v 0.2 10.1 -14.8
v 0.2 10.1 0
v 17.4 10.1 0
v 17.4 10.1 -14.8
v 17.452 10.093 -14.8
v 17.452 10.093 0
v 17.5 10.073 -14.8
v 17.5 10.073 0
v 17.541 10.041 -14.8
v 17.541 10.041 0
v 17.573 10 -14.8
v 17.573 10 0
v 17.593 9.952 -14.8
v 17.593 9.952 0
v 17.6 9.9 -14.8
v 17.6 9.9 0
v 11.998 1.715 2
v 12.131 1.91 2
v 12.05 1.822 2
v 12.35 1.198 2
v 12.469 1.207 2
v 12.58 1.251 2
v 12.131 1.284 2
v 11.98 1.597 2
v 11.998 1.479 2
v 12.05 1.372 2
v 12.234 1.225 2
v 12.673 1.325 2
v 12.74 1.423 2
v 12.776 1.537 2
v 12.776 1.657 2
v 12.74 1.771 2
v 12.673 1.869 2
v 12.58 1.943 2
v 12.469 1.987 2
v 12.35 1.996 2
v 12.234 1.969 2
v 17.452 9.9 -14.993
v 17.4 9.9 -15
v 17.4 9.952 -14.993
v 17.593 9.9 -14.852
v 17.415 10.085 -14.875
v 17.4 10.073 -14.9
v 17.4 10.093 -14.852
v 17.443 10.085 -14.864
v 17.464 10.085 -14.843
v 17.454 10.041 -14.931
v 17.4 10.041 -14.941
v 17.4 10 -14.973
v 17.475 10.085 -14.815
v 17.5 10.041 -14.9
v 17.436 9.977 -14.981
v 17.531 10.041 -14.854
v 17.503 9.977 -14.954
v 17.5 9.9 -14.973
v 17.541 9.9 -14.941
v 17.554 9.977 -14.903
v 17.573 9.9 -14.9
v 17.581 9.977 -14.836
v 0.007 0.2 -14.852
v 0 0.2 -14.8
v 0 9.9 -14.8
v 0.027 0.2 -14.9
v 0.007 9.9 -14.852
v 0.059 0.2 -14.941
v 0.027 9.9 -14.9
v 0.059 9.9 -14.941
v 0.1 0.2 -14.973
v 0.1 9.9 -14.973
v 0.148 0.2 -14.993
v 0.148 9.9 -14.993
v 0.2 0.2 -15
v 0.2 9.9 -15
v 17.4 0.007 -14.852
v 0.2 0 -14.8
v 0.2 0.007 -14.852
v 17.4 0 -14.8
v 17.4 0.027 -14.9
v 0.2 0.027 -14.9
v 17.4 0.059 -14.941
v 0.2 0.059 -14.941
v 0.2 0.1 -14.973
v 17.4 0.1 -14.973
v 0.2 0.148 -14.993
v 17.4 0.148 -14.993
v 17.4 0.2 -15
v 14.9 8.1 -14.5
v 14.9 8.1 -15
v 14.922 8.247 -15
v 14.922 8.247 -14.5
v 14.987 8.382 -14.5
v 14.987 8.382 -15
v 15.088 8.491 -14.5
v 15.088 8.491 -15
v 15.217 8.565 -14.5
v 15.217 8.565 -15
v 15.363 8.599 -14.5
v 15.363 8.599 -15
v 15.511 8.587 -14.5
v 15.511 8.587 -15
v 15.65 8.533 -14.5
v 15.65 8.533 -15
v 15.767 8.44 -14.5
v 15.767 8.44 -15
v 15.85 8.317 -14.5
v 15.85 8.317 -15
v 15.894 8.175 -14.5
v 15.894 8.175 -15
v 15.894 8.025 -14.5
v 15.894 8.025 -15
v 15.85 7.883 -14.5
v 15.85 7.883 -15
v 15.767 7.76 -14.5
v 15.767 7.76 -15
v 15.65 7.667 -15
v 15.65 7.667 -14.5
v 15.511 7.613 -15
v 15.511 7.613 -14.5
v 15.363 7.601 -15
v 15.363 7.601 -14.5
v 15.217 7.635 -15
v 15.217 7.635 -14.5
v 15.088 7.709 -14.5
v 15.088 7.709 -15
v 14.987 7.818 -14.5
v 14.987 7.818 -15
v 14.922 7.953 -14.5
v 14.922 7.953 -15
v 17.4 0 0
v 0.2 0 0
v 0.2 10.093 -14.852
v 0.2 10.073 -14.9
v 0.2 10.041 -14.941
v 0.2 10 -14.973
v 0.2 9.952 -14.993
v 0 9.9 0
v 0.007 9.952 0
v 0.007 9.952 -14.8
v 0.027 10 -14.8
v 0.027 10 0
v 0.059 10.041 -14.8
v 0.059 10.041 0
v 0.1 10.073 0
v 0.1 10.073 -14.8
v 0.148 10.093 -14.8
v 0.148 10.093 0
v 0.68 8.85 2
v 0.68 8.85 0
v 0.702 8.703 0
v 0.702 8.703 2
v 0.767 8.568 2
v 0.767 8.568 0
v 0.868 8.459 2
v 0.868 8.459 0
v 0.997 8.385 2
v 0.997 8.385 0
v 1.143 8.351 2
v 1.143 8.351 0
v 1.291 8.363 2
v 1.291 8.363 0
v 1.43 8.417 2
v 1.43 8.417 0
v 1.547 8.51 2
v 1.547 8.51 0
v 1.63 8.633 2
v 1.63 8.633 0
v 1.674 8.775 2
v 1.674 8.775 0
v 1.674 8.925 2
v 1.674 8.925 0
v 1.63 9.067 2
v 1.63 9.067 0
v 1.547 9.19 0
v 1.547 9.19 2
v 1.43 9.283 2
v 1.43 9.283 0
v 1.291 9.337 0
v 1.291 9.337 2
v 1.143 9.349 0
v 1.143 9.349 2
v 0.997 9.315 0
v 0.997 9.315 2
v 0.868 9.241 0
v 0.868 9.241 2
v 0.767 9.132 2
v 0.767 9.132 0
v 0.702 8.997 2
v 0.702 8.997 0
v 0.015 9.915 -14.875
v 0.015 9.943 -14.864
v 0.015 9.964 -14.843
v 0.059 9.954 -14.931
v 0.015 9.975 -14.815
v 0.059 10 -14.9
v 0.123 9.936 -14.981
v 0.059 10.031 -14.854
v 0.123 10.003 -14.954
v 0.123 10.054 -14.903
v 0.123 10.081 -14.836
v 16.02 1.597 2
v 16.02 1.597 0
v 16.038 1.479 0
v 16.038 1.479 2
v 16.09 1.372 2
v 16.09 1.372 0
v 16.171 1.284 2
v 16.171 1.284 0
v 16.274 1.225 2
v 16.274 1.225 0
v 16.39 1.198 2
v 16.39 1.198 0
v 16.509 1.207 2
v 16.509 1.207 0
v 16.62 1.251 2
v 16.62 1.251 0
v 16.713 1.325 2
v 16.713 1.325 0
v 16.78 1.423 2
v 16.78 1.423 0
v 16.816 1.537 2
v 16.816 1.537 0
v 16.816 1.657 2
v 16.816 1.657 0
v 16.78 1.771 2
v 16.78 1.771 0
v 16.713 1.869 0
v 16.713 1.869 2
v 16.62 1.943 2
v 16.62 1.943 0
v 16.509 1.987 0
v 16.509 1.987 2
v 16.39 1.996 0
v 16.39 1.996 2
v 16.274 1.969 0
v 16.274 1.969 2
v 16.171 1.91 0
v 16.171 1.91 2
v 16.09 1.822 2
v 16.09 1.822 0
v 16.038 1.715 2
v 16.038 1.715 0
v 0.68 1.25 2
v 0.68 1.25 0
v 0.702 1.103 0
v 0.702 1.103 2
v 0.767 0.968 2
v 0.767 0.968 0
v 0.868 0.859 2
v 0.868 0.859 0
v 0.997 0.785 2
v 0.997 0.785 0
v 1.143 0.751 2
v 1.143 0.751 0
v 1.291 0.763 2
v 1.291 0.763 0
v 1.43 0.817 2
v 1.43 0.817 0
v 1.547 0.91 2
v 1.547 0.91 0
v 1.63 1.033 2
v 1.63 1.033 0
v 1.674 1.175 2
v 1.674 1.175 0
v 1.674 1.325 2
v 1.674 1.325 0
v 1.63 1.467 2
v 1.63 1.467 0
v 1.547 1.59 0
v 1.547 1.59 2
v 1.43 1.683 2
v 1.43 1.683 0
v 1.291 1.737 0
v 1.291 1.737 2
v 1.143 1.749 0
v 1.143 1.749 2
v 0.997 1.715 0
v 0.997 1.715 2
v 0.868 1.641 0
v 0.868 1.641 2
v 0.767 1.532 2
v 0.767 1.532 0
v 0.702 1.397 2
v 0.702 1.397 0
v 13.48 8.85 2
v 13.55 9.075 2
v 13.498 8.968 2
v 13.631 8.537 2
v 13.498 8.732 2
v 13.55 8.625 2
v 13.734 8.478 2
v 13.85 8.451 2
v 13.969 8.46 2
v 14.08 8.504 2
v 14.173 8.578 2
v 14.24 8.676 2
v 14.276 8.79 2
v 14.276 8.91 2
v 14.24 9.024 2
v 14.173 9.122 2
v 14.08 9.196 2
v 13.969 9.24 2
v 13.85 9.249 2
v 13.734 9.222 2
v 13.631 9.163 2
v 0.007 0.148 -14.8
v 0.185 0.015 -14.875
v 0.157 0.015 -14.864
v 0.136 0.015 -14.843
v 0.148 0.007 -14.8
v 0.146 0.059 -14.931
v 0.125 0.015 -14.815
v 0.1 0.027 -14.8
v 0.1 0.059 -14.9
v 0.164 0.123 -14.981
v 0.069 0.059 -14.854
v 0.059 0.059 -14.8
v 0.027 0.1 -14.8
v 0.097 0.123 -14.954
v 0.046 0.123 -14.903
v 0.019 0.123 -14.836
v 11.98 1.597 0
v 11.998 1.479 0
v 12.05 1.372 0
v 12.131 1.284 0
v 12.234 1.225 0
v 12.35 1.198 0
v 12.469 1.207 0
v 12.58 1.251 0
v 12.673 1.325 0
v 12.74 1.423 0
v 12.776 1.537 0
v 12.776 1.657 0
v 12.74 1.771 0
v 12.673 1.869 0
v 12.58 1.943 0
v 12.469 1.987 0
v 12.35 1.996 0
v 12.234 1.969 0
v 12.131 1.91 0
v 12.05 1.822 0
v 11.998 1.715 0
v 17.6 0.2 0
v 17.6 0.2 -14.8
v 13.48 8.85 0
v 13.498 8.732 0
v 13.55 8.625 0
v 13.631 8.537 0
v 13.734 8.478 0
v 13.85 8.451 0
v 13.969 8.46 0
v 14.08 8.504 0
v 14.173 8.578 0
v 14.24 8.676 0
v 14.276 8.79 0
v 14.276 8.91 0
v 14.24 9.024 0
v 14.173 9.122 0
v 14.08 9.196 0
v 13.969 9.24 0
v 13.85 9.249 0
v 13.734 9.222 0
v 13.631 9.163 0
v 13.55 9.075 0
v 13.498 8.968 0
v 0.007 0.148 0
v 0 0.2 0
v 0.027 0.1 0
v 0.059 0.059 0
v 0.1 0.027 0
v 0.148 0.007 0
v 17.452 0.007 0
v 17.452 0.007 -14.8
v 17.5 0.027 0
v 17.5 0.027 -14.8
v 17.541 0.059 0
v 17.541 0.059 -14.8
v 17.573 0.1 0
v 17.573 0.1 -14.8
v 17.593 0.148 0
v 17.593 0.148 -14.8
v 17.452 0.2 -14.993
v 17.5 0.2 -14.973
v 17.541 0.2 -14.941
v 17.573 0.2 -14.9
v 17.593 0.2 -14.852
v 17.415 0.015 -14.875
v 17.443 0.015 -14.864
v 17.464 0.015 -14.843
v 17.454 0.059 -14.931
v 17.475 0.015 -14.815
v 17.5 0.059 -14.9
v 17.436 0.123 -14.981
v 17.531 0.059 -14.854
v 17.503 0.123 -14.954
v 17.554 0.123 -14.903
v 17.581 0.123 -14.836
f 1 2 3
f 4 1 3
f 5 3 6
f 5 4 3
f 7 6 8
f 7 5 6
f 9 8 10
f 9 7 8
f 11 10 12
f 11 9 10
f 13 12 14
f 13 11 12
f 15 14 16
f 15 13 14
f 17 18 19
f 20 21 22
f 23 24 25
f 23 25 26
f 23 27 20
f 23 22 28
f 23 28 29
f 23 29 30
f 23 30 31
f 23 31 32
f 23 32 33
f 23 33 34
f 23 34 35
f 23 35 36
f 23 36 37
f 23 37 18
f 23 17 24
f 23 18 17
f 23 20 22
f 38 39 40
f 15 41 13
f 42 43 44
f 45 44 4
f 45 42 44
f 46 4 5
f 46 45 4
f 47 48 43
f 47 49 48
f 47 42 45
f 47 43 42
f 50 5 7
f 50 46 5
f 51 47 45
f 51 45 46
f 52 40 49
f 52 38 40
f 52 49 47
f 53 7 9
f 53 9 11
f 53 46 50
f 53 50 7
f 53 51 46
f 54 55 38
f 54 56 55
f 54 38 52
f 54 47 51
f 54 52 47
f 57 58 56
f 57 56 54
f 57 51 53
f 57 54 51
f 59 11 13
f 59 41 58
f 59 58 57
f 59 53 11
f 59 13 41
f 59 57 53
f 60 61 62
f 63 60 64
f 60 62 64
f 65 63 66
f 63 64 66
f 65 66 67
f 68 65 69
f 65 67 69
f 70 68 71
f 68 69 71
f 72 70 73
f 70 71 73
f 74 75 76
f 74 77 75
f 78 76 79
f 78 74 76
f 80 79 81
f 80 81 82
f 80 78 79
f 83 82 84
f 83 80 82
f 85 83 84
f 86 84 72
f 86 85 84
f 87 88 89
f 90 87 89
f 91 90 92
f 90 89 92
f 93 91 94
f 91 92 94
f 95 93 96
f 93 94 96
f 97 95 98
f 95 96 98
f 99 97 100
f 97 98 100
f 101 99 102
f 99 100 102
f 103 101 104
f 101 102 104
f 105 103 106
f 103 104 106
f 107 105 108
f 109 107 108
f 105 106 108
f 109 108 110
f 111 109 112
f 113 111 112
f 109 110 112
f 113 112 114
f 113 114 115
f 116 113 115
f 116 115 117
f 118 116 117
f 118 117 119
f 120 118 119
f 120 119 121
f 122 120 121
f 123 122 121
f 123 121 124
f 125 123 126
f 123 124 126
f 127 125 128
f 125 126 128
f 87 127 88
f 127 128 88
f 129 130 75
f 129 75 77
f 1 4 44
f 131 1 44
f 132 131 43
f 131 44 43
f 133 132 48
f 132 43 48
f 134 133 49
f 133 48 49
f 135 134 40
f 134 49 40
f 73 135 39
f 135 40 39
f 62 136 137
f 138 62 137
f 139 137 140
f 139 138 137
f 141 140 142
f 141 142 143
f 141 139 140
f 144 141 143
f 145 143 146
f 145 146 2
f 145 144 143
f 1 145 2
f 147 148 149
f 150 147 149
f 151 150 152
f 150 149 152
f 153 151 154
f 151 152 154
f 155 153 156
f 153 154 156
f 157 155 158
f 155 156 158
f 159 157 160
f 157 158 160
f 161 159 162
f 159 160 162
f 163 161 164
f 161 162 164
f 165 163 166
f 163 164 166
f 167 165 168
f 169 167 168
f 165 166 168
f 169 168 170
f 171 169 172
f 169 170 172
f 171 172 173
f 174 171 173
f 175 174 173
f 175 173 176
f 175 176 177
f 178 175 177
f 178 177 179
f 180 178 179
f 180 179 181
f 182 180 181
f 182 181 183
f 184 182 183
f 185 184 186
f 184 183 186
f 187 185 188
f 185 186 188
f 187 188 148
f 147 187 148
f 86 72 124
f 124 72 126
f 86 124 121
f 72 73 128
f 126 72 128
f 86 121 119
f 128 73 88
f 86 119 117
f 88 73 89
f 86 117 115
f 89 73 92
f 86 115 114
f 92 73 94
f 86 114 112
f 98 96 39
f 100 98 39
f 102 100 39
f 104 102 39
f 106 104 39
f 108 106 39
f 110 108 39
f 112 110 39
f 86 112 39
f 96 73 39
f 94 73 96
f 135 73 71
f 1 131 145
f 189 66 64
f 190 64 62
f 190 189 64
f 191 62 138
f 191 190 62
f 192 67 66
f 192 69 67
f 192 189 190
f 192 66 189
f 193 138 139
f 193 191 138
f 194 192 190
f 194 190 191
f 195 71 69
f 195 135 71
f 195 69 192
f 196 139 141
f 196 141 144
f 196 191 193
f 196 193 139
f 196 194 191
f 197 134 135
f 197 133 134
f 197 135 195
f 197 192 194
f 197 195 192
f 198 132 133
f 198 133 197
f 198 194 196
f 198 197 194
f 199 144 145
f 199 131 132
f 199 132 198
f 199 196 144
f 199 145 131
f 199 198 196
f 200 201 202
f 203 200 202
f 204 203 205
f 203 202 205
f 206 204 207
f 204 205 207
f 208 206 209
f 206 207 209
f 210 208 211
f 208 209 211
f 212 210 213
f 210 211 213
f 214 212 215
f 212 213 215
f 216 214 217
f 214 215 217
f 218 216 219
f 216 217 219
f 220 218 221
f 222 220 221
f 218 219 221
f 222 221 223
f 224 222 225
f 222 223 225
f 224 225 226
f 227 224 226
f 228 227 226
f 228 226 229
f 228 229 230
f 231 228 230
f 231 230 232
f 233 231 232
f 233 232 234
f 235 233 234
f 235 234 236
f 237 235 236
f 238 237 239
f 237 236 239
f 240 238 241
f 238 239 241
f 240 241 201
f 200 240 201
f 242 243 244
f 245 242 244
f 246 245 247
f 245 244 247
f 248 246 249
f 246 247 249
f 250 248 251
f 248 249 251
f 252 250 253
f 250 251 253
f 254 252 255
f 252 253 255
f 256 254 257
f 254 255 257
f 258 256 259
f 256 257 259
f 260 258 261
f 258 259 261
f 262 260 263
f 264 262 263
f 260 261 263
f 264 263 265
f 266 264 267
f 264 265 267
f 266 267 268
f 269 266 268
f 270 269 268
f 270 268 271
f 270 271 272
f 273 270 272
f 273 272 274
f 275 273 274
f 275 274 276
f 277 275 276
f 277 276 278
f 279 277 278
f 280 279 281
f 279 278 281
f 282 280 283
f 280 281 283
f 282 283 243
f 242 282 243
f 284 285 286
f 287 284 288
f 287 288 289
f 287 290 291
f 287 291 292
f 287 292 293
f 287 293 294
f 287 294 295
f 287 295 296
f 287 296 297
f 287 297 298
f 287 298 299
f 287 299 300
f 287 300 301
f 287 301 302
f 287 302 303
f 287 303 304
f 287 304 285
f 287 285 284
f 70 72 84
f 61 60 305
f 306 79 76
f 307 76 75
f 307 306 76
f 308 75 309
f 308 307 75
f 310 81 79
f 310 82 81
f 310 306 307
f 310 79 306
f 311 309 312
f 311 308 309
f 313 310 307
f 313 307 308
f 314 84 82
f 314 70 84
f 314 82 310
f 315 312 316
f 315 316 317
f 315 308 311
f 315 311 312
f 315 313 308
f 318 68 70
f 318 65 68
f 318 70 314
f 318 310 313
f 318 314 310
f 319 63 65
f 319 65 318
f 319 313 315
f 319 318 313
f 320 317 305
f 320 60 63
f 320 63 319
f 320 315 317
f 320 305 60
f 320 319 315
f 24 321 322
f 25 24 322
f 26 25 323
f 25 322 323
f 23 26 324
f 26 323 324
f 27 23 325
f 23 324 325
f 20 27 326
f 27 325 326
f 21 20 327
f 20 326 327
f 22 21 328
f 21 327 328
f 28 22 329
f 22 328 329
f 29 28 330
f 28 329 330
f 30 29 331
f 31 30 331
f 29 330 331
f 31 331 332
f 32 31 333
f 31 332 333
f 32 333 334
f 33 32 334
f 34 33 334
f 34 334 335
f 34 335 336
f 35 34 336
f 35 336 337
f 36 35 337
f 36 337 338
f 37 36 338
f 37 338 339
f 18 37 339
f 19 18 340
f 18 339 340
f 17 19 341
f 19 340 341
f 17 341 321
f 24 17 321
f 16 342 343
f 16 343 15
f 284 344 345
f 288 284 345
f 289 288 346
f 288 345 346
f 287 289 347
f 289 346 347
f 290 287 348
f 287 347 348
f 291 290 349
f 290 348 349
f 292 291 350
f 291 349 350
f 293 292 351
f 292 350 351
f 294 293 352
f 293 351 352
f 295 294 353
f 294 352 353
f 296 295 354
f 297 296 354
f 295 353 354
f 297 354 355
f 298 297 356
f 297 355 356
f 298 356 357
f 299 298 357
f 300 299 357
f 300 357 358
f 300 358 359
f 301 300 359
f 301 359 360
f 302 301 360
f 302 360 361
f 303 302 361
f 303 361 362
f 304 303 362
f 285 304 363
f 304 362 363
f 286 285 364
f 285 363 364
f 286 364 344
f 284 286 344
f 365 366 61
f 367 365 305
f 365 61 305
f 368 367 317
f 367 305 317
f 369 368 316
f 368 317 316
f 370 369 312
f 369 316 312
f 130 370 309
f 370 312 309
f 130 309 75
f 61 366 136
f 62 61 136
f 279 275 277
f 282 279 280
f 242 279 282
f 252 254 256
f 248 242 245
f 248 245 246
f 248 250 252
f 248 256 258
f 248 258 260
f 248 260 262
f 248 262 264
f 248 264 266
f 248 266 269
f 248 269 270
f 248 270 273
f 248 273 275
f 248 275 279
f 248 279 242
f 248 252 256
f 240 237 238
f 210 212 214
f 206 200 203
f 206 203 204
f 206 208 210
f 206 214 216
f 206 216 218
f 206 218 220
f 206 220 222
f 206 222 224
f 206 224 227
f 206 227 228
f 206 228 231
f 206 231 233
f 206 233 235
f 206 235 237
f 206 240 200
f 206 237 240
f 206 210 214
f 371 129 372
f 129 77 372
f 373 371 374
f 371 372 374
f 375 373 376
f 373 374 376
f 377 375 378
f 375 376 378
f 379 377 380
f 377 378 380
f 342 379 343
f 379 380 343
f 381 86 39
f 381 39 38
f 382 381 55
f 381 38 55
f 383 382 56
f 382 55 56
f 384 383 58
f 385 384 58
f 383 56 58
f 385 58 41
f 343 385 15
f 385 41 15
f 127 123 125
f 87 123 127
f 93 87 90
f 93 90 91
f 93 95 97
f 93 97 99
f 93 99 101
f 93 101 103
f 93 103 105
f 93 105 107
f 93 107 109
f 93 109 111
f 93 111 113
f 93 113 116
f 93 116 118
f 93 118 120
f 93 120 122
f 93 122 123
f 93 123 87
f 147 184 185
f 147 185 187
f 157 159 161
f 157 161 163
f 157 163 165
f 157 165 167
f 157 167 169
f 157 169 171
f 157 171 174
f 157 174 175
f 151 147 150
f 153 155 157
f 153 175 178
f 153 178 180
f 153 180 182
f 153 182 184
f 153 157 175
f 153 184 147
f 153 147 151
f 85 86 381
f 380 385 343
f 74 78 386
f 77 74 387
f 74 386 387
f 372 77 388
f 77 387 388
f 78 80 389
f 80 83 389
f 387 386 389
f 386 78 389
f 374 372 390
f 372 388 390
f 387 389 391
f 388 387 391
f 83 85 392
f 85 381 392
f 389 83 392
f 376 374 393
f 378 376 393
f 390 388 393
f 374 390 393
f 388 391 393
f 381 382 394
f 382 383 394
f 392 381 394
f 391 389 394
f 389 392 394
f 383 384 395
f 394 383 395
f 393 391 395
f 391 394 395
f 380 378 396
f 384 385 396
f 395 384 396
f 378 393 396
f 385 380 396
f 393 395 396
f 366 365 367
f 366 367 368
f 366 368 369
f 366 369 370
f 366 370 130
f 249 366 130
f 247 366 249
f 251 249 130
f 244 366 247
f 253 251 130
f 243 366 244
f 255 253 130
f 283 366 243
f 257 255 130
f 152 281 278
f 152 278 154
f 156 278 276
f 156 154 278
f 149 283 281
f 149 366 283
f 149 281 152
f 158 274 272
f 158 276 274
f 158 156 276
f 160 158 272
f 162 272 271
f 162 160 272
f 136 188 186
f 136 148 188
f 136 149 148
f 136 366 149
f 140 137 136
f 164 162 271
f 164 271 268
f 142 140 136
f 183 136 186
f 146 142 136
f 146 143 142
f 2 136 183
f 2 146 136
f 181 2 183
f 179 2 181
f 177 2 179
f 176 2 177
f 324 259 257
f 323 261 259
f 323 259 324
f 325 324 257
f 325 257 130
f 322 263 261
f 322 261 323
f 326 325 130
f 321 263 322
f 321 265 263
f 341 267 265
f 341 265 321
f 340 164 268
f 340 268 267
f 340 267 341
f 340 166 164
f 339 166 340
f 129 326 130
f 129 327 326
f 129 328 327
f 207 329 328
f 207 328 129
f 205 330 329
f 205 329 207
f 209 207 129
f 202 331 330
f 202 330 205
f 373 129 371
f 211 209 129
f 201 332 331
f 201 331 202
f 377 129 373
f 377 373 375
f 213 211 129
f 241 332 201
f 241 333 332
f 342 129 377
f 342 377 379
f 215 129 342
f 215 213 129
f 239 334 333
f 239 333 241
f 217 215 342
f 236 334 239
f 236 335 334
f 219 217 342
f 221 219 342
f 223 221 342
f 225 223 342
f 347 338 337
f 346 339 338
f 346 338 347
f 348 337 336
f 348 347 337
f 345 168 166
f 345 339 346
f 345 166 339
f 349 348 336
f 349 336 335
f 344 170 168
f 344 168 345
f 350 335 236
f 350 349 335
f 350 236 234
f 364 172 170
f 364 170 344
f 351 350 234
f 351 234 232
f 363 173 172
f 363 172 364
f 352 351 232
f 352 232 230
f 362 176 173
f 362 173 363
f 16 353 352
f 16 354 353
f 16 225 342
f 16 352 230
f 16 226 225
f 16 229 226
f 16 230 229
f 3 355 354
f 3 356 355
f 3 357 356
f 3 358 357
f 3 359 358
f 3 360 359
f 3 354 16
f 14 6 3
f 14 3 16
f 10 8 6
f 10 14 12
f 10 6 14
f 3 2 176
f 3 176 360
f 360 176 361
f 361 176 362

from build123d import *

# Parameters (mm, degrees)
SKETCH_1_W          = 17.6
SKETCH_1_H          = 10.1
EXTRUDE_1_DEPTH     = 15
SKETCH_2_R          = 0.5
SKETCH_2_R_2        = 0.4
EXTRUDE_2_DEPTH     = 2
FILLET_1_R          = 0.2
SKETCH_3_R          = 0.5
CUT_EXTRUDE_1_DEPTH = 0.5


with BuildPart() as part:
    # 草图1 → 凸台-拉伸1 (new body)
    with BuildSketch(Plane.XY):
        with Locations((8.8, 5.05)):
            Rectangle(SKETCH_1_W, SKETCH_1_H)
    extrude(amount=-EXTRUDE_1_DEPTH)

    # 草图2 → 凸台-拉伸2 (add)
    with BuildSketch(Plane.XY):
        with Locations(Location((1.18, 8.85, 0), (0, 0, 180))):
            Circle(SKETCH_2_R)
        with Locations(Location((13.88, 8.85, 0), (0, 0, 180))):
            Circle(SKETCH_2_R_2)
        with Locations(Location((12.38, 1.596982533, 0), (0, 0, 180))):
            Circle(SKETCH_2_R_2)
        with Locations(Location((16.42, 1.596982533, 0), (0, 0, 180))):
            Circle(SKETCH_2_R_2)
        with Locations(Location((1.18, 1.25, 0), (0, 0, 180))):
            Circle(SKETCH_2_R)
    extrude(amount=EXTRUDE_2_DEPTH)

    # 圆角1
    fillet_1_edges = [part.edges().sort_by_distance(p)[0] for p in [
        (17.6, 5.05, -15),
        (8.8, 10.1, -15),
        (0, 5.05, -15),
        (8.8, 0, -15),
        (0, 10.1, -7.5),
        (17.6, 10.1, -7.5),
        (17.6, 0, -7.5),
        (0, 0, -7.5),
    ]]
    fillet(fillet_1_edges, radius=FILLET_1_R)

    # 草图3 → 切除-拉伸1 (cut)
    with BuildSketch(Plane(origin=(0, 0, -15), x_dir=(-1, 0, 0), z_dir=(0, 0, -1))):
        with Locations((-15.4, 8.1)):
            Circle(SKETCH_3_R)
    extrude(amount=-CUT_EXTRUDE_1_DEPTH, mode=Mode.SUBTRACT)


solid = part.part
